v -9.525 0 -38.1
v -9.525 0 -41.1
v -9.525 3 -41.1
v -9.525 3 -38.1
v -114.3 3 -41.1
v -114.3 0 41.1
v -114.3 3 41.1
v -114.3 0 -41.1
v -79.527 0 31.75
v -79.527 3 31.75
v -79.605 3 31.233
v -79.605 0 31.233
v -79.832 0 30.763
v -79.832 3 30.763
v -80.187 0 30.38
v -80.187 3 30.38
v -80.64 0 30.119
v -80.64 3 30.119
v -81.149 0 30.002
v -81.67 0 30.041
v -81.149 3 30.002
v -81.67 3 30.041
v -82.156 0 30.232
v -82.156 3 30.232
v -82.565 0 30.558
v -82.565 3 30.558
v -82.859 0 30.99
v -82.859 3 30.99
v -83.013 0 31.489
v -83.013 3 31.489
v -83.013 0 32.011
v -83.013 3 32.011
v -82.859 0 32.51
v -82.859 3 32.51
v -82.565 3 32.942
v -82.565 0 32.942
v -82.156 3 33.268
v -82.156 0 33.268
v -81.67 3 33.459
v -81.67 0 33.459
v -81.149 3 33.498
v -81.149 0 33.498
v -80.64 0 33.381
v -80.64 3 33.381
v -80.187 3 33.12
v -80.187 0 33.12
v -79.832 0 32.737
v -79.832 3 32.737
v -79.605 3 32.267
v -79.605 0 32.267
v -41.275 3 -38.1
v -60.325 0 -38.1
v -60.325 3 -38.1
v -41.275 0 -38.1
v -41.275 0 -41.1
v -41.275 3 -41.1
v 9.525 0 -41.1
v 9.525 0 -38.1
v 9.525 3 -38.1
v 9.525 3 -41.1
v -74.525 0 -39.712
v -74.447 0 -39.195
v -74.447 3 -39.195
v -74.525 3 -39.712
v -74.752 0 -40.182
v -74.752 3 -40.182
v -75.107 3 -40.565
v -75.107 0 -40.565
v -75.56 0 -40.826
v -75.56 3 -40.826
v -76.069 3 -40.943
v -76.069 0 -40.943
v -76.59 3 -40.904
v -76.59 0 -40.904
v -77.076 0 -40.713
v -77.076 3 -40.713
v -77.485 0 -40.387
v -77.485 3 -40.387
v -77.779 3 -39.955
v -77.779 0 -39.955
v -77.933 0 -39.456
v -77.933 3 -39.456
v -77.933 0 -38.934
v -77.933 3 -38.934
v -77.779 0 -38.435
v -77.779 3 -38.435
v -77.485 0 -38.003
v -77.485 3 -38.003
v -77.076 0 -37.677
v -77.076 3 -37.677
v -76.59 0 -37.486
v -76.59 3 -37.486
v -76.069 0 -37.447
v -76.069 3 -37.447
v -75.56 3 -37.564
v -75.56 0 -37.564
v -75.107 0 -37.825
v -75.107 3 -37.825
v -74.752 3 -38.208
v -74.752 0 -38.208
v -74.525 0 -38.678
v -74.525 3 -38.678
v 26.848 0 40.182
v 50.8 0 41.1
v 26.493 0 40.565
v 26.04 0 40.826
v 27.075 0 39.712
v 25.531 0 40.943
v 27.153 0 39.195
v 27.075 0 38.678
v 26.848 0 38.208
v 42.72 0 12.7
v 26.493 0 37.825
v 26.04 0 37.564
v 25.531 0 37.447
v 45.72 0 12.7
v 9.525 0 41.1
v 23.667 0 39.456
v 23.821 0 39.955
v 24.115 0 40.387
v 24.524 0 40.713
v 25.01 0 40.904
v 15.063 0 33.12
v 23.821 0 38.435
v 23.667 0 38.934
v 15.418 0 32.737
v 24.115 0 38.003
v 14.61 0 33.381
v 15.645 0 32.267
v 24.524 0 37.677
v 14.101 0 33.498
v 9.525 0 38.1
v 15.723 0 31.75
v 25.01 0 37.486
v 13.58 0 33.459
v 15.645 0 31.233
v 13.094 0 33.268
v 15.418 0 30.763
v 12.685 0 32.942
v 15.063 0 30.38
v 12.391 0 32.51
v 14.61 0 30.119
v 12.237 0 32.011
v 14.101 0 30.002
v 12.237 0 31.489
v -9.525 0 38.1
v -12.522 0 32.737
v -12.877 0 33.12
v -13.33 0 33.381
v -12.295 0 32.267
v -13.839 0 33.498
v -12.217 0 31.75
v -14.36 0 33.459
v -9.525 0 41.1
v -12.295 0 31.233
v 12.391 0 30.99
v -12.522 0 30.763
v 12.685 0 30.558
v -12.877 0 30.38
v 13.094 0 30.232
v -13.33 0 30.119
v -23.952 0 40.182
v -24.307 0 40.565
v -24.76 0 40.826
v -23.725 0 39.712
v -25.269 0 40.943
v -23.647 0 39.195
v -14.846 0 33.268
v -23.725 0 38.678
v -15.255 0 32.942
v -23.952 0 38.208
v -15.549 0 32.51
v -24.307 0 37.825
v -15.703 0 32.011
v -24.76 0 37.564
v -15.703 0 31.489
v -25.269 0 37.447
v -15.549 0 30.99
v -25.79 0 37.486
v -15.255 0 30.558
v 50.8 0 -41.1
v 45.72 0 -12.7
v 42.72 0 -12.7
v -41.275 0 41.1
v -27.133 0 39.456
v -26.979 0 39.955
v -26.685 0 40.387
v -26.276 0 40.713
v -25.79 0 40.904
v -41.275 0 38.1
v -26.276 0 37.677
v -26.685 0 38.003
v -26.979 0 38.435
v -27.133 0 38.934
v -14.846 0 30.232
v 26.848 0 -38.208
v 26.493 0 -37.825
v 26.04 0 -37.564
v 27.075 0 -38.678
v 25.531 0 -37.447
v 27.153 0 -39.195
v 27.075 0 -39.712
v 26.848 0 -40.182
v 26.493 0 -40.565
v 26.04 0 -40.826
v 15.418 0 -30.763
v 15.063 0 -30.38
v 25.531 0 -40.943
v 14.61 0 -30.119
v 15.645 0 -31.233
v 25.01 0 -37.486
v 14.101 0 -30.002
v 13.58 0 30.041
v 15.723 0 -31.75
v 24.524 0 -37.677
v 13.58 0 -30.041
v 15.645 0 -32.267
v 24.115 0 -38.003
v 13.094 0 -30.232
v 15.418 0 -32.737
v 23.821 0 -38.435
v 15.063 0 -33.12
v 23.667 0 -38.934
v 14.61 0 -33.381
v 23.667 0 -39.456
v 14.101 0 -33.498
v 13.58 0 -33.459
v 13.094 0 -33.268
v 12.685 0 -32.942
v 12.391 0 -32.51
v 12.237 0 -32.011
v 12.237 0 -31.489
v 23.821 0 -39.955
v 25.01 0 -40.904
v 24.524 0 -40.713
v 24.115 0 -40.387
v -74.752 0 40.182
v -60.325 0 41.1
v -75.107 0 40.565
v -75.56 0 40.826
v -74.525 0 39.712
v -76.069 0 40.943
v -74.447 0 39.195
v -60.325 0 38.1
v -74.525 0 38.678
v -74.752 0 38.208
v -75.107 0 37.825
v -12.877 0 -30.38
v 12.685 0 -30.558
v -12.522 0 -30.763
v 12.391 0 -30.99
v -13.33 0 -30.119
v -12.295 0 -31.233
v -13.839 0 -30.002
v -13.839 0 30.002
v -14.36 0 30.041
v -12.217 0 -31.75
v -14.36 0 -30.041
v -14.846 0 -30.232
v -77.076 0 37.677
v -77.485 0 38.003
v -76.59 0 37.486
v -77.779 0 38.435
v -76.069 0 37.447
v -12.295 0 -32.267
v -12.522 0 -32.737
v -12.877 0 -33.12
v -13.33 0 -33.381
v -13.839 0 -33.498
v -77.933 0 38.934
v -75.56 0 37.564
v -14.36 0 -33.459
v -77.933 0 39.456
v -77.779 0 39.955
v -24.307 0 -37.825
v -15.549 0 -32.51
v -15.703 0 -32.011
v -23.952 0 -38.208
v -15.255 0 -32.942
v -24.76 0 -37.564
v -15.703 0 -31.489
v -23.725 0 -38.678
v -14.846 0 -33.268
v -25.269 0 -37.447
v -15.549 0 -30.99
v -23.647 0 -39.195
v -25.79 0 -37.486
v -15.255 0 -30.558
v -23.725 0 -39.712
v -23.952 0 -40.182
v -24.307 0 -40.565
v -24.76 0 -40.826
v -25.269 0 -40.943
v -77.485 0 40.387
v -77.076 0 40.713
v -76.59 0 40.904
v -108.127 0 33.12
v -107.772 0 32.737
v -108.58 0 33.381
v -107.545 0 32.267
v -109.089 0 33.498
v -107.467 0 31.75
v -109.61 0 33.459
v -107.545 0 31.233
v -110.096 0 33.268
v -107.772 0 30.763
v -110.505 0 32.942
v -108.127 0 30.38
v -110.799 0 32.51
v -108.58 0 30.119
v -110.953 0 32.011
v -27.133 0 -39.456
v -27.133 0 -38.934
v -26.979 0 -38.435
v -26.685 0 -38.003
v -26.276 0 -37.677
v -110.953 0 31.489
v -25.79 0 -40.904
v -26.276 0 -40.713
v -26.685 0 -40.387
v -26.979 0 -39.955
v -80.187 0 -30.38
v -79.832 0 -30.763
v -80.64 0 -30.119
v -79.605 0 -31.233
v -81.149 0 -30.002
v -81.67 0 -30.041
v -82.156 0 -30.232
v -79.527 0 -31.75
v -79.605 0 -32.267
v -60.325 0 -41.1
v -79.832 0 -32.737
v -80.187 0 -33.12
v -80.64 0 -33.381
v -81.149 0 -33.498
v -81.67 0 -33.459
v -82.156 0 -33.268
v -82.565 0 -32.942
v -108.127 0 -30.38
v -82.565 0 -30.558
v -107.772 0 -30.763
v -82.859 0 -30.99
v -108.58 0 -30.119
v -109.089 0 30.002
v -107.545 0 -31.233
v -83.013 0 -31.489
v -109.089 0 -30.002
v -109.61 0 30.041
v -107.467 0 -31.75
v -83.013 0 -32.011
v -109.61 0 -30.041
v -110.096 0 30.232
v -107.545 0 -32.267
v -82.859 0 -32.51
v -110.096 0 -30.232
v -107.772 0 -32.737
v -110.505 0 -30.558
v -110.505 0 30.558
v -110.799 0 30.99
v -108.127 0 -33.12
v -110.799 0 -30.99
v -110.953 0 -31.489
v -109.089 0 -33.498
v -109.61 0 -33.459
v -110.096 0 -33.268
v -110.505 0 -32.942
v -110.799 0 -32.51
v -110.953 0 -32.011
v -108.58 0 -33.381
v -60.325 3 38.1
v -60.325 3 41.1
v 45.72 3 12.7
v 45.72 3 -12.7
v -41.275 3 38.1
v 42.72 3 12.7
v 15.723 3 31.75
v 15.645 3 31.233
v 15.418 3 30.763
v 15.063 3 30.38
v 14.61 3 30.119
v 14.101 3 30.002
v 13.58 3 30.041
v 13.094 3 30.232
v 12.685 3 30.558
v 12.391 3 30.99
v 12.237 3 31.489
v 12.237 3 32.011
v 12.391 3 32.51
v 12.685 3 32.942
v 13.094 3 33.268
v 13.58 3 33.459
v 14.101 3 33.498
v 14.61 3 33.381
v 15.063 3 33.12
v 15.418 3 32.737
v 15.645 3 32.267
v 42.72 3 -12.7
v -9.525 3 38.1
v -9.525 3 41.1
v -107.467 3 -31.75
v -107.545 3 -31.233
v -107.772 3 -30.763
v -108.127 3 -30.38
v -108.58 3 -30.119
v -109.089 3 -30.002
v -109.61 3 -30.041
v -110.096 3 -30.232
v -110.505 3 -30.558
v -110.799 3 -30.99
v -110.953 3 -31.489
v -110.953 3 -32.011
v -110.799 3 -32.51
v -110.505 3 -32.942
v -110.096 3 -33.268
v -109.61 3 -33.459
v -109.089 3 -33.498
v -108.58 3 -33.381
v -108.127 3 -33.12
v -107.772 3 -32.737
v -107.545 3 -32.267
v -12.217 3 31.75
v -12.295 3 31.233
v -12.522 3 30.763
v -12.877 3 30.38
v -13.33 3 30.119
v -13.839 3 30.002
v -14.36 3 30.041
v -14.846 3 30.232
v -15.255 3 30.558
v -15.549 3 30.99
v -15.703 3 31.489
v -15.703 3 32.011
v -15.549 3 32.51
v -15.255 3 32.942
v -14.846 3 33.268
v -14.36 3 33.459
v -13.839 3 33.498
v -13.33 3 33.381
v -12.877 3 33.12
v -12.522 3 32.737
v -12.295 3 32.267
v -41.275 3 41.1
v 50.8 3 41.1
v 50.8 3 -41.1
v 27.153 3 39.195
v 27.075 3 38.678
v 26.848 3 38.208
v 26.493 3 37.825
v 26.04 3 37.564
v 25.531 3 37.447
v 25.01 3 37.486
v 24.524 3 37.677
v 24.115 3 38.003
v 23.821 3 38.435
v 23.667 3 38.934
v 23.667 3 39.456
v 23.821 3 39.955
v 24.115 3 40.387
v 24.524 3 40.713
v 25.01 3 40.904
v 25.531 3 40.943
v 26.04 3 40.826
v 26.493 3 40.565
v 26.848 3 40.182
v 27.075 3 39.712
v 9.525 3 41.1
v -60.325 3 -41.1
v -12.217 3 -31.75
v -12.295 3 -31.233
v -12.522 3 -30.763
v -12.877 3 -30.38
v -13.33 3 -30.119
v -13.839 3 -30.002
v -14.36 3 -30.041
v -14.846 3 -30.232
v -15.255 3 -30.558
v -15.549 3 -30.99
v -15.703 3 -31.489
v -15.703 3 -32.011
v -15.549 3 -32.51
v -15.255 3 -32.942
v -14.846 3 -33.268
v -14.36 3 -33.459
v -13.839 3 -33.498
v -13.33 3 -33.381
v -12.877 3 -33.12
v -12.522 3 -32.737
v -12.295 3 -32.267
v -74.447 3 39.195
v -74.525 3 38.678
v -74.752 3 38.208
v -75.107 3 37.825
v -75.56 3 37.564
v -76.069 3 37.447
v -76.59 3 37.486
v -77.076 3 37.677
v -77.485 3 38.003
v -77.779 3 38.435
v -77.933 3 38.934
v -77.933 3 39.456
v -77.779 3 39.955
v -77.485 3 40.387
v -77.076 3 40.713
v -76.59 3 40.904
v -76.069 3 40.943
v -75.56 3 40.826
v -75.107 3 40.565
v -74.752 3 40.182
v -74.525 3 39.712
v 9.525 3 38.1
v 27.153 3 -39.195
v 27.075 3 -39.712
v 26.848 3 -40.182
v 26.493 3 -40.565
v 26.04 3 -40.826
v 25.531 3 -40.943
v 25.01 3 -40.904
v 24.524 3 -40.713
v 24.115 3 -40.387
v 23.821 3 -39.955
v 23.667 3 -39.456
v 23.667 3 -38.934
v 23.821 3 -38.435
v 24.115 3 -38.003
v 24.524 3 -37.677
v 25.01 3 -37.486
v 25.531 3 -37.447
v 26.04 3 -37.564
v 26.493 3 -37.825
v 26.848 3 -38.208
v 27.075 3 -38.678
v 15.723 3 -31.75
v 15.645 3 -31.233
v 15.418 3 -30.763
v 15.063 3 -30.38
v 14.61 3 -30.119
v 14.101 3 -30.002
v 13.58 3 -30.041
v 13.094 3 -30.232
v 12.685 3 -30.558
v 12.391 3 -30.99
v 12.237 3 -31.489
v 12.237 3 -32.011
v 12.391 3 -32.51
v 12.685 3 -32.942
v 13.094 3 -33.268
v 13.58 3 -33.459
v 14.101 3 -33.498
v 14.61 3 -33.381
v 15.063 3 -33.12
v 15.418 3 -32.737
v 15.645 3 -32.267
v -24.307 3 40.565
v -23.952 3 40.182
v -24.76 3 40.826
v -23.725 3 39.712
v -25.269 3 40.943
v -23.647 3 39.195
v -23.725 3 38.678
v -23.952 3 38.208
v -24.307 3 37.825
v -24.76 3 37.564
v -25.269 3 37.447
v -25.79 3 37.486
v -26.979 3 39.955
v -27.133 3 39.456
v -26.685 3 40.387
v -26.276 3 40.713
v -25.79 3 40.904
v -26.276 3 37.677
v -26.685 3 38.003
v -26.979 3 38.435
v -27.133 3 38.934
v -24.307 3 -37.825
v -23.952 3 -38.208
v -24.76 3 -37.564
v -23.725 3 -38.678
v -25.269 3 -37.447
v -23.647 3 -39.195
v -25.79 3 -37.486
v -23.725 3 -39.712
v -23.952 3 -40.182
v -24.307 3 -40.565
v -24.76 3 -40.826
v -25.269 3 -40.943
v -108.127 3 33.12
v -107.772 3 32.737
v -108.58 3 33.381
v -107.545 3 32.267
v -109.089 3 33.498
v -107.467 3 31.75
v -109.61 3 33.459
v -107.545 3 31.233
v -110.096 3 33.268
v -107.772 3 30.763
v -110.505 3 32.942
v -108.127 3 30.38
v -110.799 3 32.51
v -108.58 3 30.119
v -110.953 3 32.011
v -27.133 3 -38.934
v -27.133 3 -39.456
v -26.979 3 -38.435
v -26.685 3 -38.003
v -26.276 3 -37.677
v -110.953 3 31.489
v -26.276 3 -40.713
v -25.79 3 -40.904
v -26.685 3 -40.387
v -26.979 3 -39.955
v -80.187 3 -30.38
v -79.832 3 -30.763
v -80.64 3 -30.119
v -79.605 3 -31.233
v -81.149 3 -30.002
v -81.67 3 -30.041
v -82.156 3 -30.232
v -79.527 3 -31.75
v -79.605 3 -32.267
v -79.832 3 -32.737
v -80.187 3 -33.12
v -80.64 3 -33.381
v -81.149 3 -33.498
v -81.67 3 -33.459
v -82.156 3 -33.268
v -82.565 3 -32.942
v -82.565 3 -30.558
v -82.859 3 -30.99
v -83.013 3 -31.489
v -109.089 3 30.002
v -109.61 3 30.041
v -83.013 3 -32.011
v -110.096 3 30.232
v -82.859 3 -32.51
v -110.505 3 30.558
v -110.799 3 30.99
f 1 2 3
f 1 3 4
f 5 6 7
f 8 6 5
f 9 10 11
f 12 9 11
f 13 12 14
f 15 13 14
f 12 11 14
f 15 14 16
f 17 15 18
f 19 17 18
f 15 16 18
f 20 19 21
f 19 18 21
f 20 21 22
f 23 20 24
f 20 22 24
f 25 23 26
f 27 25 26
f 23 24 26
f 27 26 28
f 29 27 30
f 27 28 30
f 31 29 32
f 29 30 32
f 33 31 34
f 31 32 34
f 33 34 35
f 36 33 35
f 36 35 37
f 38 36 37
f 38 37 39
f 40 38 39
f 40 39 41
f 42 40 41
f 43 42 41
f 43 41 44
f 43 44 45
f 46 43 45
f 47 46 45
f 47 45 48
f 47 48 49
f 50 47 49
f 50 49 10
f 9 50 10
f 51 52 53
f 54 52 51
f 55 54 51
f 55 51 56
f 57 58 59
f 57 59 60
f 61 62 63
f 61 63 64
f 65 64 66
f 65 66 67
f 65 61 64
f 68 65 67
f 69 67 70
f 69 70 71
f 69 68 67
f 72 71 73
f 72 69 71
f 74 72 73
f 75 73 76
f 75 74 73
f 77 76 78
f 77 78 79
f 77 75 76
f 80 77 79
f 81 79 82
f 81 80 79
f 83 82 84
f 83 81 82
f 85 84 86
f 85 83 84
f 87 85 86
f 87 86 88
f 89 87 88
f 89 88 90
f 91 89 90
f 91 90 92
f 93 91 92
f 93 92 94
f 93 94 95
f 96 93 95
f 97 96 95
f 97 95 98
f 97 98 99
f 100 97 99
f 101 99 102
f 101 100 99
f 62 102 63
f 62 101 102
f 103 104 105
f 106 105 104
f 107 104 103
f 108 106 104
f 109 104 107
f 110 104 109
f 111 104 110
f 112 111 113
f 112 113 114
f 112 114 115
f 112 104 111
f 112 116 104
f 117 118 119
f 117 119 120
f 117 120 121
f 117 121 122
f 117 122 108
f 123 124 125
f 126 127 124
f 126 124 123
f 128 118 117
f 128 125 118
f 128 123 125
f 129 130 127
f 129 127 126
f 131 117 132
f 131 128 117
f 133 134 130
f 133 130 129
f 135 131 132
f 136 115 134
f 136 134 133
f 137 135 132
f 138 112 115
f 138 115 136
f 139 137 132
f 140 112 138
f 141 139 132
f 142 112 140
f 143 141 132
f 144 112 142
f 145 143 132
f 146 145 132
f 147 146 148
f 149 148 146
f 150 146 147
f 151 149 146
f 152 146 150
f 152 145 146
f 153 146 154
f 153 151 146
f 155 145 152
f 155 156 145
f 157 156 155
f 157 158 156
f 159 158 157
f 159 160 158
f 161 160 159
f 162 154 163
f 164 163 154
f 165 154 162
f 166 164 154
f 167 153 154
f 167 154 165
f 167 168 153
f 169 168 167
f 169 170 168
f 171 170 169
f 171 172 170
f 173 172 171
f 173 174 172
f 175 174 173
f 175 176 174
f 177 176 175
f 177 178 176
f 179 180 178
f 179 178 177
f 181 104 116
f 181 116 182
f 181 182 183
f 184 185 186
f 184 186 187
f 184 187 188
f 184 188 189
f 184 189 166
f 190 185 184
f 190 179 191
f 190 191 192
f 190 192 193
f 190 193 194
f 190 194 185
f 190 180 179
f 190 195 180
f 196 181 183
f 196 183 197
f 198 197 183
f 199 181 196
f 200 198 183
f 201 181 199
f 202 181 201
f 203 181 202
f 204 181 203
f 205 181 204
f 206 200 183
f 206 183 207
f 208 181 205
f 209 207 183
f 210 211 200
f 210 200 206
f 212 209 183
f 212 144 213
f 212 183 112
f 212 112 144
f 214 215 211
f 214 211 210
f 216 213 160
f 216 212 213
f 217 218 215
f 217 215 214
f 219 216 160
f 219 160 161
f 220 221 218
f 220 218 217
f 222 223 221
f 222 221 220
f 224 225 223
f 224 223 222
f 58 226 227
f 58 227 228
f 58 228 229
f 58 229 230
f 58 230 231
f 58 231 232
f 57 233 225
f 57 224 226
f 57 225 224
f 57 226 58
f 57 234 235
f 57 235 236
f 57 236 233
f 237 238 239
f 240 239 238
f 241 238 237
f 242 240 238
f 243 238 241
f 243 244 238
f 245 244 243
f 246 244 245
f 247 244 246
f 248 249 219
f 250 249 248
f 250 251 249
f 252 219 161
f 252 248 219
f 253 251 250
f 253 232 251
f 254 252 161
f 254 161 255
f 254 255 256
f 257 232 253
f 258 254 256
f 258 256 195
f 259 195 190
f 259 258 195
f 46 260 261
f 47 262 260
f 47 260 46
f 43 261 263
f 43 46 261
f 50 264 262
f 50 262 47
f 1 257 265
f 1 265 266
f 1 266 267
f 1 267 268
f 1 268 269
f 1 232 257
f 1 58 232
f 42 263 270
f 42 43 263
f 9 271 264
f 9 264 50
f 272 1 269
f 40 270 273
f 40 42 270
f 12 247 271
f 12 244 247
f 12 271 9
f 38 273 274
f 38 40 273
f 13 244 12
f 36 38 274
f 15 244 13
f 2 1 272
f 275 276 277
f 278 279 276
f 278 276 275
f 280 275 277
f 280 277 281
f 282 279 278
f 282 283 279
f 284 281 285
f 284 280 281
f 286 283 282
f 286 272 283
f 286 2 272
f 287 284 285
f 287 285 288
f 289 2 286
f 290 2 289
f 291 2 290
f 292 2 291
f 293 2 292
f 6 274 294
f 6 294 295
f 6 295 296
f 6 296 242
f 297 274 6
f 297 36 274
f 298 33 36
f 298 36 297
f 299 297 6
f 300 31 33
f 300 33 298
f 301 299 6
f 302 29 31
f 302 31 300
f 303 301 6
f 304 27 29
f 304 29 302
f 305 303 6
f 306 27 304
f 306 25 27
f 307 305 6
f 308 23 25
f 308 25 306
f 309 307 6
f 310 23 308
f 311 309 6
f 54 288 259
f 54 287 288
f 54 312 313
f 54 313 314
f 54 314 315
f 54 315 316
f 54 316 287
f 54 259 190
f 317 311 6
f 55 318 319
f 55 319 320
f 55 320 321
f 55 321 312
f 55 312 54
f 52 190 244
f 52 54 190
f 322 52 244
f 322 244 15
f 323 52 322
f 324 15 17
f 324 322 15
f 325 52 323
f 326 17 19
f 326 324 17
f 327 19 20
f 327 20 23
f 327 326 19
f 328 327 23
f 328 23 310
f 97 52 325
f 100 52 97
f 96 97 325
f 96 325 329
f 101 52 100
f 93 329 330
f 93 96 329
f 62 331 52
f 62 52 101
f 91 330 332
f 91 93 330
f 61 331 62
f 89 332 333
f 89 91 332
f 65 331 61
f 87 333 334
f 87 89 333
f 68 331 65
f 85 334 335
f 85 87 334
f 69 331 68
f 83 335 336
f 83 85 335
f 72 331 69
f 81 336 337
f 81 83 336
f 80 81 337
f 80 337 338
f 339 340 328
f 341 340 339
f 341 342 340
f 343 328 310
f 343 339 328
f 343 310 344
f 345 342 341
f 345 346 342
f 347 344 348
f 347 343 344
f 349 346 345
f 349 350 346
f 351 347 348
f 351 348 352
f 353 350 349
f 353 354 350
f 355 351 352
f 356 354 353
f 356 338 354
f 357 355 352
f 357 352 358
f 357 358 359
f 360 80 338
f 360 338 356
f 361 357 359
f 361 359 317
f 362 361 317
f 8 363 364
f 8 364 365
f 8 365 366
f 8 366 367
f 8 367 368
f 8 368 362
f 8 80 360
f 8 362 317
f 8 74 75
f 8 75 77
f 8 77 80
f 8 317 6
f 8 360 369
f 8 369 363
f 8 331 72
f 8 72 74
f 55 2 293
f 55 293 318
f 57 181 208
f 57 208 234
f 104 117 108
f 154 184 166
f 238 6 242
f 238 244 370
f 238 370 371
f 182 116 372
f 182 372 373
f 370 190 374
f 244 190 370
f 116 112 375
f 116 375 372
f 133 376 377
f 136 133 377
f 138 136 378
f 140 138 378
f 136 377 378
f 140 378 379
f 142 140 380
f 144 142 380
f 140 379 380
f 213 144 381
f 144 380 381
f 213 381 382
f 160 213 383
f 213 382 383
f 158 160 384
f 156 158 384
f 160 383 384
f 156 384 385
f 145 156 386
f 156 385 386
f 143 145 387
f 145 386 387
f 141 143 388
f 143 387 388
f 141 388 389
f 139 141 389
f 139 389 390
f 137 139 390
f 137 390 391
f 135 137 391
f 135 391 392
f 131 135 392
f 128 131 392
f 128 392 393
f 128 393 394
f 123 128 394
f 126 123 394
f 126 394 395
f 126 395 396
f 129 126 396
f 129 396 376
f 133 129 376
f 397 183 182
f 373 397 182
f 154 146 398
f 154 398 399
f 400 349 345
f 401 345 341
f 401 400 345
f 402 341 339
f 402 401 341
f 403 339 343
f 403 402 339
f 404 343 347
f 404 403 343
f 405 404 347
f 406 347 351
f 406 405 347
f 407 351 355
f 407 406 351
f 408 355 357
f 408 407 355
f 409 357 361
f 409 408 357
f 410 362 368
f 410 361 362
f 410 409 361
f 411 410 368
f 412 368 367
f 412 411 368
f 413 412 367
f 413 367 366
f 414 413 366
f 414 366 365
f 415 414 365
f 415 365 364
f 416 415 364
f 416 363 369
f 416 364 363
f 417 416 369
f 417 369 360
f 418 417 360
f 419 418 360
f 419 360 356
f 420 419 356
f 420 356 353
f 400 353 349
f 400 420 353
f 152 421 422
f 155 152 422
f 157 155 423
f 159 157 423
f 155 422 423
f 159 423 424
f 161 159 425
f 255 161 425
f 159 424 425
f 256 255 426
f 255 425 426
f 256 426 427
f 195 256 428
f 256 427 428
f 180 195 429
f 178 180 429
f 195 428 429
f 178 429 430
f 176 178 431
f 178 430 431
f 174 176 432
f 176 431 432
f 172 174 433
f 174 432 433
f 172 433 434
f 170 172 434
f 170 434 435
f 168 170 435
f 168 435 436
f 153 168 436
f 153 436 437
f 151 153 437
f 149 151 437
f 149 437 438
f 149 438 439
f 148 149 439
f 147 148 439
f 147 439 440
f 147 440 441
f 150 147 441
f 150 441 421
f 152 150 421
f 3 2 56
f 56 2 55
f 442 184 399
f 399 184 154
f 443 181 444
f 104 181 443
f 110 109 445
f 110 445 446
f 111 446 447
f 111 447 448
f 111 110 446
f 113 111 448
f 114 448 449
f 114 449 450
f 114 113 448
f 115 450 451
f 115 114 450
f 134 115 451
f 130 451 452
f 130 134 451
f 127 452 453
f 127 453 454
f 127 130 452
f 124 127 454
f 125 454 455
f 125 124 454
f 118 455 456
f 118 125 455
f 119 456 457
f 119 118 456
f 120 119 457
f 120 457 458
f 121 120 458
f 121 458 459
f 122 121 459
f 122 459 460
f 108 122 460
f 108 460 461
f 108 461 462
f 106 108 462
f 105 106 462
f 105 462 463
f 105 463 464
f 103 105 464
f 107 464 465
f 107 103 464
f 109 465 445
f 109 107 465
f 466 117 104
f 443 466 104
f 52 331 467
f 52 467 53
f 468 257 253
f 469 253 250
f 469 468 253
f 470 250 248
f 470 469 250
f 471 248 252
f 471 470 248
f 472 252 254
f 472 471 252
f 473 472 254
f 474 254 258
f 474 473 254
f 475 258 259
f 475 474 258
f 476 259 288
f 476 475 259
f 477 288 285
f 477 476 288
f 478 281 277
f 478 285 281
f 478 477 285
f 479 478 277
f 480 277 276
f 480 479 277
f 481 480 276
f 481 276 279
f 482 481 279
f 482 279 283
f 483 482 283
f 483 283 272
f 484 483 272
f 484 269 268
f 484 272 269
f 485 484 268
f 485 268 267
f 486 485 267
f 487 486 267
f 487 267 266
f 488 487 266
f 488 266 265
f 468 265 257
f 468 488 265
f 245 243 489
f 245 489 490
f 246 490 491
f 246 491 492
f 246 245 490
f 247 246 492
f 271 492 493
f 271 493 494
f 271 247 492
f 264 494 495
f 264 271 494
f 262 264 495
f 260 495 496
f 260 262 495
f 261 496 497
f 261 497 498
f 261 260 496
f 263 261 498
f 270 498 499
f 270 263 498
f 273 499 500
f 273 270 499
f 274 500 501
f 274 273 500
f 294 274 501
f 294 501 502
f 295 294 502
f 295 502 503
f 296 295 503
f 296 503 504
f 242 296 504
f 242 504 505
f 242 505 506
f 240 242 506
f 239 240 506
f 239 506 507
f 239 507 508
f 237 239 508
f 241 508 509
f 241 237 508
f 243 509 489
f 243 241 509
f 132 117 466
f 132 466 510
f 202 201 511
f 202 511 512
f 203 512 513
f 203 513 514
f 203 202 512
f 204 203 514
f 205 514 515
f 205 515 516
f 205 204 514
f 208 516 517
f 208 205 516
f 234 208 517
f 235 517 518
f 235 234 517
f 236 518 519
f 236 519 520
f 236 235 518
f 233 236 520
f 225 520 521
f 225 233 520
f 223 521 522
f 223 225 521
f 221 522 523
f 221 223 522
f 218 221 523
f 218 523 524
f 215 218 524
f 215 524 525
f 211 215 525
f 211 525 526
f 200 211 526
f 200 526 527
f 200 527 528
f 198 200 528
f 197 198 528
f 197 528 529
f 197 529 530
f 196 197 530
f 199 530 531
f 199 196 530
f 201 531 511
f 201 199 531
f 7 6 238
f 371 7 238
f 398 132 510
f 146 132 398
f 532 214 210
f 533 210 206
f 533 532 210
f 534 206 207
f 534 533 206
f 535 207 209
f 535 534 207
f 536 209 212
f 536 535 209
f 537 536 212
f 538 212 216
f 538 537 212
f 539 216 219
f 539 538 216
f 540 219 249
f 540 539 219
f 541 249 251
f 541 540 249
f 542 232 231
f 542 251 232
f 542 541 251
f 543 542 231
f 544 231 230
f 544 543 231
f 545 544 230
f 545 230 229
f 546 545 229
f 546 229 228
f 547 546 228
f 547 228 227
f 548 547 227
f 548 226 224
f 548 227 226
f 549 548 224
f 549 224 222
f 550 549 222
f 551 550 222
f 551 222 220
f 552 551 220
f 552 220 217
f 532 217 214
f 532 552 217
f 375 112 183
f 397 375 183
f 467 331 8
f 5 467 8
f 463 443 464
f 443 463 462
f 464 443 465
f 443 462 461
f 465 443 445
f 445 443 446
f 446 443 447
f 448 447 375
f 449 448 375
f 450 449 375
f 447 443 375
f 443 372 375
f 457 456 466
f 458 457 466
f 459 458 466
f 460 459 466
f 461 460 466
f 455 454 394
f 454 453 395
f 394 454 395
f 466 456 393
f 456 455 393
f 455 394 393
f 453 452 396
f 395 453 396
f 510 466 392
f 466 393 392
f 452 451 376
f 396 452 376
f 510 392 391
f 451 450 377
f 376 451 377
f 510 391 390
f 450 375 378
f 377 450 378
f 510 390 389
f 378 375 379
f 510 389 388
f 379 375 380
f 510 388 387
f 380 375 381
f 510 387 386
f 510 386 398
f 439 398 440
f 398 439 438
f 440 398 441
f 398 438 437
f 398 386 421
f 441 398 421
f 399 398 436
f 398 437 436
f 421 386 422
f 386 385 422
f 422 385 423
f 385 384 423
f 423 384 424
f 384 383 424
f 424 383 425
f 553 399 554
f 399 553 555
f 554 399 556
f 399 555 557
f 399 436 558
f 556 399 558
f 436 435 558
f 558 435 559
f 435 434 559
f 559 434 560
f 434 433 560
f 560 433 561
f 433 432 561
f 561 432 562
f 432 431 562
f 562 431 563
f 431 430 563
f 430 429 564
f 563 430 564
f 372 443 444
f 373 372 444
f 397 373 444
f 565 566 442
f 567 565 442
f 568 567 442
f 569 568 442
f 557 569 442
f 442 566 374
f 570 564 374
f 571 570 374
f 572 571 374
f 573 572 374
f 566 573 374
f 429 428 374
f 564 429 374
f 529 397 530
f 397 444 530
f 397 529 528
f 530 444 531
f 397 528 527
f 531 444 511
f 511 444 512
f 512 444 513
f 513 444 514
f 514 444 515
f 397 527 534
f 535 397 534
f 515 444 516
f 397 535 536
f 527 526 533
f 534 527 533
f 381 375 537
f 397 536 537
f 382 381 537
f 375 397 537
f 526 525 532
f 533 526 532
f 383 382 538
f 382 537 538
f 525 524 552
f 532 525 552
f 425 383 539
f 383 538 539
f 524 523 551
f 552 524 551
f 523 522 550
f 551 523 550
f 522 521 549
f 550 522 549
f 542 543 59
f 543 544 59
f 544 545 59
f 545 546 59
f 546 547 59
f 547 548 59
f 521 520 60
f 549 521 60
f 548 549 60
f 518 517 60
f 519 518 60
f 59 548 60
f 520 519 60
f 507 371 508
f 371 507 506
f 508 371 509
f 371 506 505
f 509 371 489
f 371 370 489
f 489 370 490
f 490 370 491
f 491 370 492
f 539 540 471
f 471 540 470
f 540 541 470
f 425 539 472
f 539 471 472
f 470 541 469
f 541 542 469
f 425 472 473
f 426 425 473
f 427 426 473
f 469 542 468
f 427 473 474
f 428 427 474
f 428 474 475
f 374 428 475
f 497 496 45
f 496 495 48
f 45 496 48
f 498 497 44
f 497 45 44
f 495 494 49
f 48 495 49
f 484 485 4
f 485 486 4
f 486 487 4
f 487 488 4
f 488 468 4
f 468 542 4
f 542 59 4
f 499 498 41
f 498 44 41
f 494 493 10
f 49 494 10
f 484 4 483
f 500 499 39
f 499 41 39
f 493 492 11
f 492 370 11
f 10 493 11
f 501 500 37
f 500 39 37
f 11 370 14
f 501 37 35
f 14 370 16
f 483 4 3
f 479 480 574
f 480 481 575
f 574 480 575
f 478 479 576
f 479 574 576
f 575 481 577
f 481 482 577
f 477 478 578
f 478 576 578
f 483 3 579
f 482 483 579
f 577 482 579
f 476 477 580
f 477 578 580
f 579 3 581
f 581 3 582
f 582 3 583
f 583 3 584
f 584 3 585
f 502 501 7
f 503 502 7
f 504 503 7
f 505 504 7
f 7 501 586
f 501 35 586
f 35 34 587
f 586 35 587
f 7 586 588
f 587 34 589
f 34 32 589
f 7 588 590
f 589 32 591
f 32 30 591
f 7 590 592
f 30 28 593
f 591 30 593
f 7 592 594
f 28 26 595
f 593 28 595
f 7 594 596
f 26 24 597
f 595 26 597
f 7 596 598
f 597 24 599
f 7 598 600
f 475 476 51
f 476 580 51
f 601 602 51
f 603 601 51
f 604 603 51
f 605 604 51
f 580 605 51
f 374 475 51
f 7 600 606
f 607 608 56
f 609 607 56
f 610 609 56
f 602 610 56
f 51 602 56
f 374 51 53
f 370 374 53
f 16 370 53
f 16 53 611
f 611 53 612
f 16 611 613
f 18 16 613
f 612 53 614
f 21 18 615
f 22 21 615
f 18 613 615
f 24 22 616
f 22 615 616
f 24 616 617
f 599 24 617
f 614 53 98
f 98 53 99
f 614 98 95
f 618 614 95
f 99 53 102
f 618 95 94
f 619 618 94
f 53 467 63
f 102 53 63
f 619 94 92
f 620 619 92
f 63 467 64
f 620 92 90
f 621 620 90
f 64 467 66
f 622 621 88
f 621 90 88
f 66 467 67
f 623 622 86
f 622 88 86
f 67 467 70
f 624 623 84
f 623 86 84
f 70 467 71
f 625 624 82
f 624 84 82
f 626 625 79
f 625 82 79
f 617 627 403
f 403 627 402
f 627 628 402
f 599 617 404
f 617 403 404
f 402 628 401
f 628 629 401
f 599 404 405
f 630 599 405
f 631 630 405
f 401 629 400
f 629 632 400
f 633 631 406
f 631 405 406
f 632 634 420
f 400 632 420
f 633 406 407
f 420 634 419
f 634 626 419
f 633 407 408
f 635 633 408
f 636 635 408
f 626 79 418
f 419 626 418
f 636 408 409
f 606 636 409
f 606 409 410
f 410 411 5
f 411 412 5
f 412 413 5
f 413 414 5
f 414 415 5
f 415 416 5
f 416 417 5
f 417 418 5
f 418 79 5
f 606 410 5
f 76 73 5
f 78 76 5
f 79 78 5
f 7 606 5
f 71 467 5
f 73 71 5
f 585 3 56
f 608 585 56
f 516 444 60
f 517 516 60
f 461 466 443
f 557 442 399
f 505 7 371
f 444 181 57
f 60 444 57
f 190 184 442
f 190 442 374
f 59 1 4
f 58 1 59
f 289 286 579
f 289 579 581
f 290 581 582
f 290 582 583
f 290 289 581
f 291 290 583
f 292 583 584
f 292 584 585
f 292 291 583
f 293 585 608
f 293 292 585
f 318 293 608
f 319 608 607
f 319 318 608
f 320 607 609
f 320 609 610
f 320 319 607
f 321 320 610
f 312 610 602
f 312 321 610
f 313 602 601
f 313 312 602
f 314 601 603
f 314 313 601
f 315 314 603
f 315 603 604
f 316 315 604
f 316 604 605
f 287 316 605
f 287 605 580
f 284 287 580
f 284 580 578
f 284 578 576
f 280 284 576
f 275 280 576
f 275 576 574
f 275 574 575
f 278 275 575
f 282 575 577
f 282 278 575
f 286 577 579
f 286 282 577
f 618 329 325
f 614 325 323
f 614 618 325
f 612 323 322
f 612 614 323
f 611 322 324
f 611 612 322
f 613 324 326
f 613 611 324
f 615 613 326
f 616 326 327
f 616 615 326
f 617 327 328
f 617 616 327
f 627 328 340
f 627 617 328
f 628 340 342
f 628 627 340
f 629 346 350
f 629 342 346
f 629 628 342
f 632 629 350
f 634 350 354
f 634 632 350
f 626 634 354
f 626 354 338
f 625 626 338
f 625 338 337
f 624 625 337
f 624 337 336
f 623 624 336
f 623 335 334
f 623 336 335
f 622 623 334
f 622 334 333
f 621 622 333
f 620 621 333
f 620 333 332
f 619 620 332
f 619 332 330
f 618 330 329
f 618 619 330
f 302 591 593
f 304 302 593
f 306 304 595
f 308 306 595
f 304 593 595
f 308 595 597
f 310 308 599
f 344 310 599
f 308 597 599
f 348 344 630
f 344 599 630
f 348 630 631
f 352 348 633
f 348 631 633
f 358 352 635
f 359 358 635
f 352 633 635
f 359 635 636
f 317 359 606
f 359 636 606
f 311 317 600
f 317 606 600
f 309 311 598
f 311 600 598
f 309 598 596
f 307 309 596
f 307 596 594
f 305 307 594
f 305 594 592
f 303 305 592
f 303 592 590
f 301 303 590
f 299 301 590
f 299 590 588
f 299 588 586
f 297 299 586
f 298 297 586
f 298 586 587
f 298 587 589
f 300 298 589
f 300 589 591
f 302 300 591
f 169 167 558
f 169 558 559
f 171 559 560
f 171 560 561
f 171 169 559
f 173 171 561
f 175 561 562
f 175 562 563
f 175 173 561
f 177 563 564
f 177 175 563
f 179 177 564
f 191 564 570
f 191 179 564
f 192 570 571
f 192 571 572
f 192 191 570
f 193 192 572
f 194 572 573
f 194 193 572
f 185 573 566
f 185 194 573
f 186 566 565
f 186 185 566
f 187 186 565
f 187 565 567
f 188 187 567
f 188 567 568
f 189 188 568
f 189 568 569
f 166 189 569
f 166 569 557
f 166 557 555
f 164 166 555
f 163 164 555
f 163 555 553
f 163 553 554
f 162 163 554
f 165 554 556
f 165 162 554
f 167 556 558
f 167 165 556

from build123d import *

# Parameters (mm, degrees)
SKETCH1_R           = 1.7526
SKETCH1_W           = 3
SKETCH1_H           = 25.4
BOSS_EXTRUDE1_DEPTH = 3
SKETCH2_R           = 1.7526
CUT_EXTRUDE1_DEPTH  = 4


with BuildPart() as part:
    # Sketch1 → Boss-Extrude1 (new body)
    with BuildSketch(Plane(origin=(0, 0, 0), x_dir=(1, 0, 0), z_dir=(0, 1, 0))):
        Polygon((-114.3, 41.1), (-77.528882775, 41.1), (-74.871117225, 41.1), (-60.325, 41.1), (-60.325, 38.1), (-41.275, 38.1), (-41.275, 41.1), (-26.728882775, 41.1), (-24.071117225, 41.1), (-9.525, 41.1), (-9.525, 38.1), (9.525, 38.1), (9.525, 41.1), (24.071117225, 41.1), (26.728882775, 41.1), (50.8, 41.1), (50.8, -41.1), (26.728882775, -41.1), (24.071117225, -41.1), (9.525, -41.1), (9.525, -38.1), (-9.525, -38.1), (-9.525, -41.1), (-24.071117225, -41.1), (-26.728882775, -41.1), (-41.275, -41.1), (-41.275, -38.1), (-60.325, -38.1), (-60.325, -41.1), (-74.871117225, -41.1), (-77.528882775, -41.1), (-114.3, -41.1), align=None)
        with Locations((-25.4, -39.195)):
            Circle(SKETCH1_R, mode=Mode.SUBTRACT)
        with Locations((25.4, -39.195)):
            Circle(SKETCH1_R, mode=Mode.SUBTRACT)
        with Locations((25.4, 39.195)):
            Circle(SKETCH1_R, mode=Mode.SUBTRACT)
        with Locations((-25.4, 39.195)):
            Circle(SKETCH1_R, mode=Mode.SUBTRACT)
        with Locations((-76.2, 39.195)):
            Circle(SKETCH1_R, mode=Mode.SUBTRACT)
        with Locations((-76.2, -39.195)):
            Circle(SKETCH1_R, mode=Mode.SUBTRACT)
        with Locations((44.22, 0)):
            Rectangle(SKETCH1_W, SKETCH1_H, mode=Mode.SUBTRACT)
    extrude(amount=BOSS_EXTRUDE1_DEPTH)

    # Sketch2 → Cut-Extrude1 (cut, through all)
    with BuildSketch(Plane(origin=(0, 3, 0), x_dir=(1, 0, 0), z_dir=(0, 1, 0))):
        with Locations((-109.22, -31.75)):
            Circle(SKETCH2_R)
        with Locations((-81.28, -31.75)):
            Circle(SKETCH2_R)
        with Locations((13.97, -31.75)):
            Circle(SKETCH2_R)
        with Locations((-13.97, -31.75)):
            Circle(SKETCH2_R)
    cut_extrude1 = extrude(amount=-CUT_EXTRUDE1_DEPTH, mode=Mode.SUBTRACT)

    # Mirror1: Cut-Extrude1 across plane
    add(cut_extrude1.mirror(Plane.XY), mode=Mode.SUBTRACT)


solid = part.part
